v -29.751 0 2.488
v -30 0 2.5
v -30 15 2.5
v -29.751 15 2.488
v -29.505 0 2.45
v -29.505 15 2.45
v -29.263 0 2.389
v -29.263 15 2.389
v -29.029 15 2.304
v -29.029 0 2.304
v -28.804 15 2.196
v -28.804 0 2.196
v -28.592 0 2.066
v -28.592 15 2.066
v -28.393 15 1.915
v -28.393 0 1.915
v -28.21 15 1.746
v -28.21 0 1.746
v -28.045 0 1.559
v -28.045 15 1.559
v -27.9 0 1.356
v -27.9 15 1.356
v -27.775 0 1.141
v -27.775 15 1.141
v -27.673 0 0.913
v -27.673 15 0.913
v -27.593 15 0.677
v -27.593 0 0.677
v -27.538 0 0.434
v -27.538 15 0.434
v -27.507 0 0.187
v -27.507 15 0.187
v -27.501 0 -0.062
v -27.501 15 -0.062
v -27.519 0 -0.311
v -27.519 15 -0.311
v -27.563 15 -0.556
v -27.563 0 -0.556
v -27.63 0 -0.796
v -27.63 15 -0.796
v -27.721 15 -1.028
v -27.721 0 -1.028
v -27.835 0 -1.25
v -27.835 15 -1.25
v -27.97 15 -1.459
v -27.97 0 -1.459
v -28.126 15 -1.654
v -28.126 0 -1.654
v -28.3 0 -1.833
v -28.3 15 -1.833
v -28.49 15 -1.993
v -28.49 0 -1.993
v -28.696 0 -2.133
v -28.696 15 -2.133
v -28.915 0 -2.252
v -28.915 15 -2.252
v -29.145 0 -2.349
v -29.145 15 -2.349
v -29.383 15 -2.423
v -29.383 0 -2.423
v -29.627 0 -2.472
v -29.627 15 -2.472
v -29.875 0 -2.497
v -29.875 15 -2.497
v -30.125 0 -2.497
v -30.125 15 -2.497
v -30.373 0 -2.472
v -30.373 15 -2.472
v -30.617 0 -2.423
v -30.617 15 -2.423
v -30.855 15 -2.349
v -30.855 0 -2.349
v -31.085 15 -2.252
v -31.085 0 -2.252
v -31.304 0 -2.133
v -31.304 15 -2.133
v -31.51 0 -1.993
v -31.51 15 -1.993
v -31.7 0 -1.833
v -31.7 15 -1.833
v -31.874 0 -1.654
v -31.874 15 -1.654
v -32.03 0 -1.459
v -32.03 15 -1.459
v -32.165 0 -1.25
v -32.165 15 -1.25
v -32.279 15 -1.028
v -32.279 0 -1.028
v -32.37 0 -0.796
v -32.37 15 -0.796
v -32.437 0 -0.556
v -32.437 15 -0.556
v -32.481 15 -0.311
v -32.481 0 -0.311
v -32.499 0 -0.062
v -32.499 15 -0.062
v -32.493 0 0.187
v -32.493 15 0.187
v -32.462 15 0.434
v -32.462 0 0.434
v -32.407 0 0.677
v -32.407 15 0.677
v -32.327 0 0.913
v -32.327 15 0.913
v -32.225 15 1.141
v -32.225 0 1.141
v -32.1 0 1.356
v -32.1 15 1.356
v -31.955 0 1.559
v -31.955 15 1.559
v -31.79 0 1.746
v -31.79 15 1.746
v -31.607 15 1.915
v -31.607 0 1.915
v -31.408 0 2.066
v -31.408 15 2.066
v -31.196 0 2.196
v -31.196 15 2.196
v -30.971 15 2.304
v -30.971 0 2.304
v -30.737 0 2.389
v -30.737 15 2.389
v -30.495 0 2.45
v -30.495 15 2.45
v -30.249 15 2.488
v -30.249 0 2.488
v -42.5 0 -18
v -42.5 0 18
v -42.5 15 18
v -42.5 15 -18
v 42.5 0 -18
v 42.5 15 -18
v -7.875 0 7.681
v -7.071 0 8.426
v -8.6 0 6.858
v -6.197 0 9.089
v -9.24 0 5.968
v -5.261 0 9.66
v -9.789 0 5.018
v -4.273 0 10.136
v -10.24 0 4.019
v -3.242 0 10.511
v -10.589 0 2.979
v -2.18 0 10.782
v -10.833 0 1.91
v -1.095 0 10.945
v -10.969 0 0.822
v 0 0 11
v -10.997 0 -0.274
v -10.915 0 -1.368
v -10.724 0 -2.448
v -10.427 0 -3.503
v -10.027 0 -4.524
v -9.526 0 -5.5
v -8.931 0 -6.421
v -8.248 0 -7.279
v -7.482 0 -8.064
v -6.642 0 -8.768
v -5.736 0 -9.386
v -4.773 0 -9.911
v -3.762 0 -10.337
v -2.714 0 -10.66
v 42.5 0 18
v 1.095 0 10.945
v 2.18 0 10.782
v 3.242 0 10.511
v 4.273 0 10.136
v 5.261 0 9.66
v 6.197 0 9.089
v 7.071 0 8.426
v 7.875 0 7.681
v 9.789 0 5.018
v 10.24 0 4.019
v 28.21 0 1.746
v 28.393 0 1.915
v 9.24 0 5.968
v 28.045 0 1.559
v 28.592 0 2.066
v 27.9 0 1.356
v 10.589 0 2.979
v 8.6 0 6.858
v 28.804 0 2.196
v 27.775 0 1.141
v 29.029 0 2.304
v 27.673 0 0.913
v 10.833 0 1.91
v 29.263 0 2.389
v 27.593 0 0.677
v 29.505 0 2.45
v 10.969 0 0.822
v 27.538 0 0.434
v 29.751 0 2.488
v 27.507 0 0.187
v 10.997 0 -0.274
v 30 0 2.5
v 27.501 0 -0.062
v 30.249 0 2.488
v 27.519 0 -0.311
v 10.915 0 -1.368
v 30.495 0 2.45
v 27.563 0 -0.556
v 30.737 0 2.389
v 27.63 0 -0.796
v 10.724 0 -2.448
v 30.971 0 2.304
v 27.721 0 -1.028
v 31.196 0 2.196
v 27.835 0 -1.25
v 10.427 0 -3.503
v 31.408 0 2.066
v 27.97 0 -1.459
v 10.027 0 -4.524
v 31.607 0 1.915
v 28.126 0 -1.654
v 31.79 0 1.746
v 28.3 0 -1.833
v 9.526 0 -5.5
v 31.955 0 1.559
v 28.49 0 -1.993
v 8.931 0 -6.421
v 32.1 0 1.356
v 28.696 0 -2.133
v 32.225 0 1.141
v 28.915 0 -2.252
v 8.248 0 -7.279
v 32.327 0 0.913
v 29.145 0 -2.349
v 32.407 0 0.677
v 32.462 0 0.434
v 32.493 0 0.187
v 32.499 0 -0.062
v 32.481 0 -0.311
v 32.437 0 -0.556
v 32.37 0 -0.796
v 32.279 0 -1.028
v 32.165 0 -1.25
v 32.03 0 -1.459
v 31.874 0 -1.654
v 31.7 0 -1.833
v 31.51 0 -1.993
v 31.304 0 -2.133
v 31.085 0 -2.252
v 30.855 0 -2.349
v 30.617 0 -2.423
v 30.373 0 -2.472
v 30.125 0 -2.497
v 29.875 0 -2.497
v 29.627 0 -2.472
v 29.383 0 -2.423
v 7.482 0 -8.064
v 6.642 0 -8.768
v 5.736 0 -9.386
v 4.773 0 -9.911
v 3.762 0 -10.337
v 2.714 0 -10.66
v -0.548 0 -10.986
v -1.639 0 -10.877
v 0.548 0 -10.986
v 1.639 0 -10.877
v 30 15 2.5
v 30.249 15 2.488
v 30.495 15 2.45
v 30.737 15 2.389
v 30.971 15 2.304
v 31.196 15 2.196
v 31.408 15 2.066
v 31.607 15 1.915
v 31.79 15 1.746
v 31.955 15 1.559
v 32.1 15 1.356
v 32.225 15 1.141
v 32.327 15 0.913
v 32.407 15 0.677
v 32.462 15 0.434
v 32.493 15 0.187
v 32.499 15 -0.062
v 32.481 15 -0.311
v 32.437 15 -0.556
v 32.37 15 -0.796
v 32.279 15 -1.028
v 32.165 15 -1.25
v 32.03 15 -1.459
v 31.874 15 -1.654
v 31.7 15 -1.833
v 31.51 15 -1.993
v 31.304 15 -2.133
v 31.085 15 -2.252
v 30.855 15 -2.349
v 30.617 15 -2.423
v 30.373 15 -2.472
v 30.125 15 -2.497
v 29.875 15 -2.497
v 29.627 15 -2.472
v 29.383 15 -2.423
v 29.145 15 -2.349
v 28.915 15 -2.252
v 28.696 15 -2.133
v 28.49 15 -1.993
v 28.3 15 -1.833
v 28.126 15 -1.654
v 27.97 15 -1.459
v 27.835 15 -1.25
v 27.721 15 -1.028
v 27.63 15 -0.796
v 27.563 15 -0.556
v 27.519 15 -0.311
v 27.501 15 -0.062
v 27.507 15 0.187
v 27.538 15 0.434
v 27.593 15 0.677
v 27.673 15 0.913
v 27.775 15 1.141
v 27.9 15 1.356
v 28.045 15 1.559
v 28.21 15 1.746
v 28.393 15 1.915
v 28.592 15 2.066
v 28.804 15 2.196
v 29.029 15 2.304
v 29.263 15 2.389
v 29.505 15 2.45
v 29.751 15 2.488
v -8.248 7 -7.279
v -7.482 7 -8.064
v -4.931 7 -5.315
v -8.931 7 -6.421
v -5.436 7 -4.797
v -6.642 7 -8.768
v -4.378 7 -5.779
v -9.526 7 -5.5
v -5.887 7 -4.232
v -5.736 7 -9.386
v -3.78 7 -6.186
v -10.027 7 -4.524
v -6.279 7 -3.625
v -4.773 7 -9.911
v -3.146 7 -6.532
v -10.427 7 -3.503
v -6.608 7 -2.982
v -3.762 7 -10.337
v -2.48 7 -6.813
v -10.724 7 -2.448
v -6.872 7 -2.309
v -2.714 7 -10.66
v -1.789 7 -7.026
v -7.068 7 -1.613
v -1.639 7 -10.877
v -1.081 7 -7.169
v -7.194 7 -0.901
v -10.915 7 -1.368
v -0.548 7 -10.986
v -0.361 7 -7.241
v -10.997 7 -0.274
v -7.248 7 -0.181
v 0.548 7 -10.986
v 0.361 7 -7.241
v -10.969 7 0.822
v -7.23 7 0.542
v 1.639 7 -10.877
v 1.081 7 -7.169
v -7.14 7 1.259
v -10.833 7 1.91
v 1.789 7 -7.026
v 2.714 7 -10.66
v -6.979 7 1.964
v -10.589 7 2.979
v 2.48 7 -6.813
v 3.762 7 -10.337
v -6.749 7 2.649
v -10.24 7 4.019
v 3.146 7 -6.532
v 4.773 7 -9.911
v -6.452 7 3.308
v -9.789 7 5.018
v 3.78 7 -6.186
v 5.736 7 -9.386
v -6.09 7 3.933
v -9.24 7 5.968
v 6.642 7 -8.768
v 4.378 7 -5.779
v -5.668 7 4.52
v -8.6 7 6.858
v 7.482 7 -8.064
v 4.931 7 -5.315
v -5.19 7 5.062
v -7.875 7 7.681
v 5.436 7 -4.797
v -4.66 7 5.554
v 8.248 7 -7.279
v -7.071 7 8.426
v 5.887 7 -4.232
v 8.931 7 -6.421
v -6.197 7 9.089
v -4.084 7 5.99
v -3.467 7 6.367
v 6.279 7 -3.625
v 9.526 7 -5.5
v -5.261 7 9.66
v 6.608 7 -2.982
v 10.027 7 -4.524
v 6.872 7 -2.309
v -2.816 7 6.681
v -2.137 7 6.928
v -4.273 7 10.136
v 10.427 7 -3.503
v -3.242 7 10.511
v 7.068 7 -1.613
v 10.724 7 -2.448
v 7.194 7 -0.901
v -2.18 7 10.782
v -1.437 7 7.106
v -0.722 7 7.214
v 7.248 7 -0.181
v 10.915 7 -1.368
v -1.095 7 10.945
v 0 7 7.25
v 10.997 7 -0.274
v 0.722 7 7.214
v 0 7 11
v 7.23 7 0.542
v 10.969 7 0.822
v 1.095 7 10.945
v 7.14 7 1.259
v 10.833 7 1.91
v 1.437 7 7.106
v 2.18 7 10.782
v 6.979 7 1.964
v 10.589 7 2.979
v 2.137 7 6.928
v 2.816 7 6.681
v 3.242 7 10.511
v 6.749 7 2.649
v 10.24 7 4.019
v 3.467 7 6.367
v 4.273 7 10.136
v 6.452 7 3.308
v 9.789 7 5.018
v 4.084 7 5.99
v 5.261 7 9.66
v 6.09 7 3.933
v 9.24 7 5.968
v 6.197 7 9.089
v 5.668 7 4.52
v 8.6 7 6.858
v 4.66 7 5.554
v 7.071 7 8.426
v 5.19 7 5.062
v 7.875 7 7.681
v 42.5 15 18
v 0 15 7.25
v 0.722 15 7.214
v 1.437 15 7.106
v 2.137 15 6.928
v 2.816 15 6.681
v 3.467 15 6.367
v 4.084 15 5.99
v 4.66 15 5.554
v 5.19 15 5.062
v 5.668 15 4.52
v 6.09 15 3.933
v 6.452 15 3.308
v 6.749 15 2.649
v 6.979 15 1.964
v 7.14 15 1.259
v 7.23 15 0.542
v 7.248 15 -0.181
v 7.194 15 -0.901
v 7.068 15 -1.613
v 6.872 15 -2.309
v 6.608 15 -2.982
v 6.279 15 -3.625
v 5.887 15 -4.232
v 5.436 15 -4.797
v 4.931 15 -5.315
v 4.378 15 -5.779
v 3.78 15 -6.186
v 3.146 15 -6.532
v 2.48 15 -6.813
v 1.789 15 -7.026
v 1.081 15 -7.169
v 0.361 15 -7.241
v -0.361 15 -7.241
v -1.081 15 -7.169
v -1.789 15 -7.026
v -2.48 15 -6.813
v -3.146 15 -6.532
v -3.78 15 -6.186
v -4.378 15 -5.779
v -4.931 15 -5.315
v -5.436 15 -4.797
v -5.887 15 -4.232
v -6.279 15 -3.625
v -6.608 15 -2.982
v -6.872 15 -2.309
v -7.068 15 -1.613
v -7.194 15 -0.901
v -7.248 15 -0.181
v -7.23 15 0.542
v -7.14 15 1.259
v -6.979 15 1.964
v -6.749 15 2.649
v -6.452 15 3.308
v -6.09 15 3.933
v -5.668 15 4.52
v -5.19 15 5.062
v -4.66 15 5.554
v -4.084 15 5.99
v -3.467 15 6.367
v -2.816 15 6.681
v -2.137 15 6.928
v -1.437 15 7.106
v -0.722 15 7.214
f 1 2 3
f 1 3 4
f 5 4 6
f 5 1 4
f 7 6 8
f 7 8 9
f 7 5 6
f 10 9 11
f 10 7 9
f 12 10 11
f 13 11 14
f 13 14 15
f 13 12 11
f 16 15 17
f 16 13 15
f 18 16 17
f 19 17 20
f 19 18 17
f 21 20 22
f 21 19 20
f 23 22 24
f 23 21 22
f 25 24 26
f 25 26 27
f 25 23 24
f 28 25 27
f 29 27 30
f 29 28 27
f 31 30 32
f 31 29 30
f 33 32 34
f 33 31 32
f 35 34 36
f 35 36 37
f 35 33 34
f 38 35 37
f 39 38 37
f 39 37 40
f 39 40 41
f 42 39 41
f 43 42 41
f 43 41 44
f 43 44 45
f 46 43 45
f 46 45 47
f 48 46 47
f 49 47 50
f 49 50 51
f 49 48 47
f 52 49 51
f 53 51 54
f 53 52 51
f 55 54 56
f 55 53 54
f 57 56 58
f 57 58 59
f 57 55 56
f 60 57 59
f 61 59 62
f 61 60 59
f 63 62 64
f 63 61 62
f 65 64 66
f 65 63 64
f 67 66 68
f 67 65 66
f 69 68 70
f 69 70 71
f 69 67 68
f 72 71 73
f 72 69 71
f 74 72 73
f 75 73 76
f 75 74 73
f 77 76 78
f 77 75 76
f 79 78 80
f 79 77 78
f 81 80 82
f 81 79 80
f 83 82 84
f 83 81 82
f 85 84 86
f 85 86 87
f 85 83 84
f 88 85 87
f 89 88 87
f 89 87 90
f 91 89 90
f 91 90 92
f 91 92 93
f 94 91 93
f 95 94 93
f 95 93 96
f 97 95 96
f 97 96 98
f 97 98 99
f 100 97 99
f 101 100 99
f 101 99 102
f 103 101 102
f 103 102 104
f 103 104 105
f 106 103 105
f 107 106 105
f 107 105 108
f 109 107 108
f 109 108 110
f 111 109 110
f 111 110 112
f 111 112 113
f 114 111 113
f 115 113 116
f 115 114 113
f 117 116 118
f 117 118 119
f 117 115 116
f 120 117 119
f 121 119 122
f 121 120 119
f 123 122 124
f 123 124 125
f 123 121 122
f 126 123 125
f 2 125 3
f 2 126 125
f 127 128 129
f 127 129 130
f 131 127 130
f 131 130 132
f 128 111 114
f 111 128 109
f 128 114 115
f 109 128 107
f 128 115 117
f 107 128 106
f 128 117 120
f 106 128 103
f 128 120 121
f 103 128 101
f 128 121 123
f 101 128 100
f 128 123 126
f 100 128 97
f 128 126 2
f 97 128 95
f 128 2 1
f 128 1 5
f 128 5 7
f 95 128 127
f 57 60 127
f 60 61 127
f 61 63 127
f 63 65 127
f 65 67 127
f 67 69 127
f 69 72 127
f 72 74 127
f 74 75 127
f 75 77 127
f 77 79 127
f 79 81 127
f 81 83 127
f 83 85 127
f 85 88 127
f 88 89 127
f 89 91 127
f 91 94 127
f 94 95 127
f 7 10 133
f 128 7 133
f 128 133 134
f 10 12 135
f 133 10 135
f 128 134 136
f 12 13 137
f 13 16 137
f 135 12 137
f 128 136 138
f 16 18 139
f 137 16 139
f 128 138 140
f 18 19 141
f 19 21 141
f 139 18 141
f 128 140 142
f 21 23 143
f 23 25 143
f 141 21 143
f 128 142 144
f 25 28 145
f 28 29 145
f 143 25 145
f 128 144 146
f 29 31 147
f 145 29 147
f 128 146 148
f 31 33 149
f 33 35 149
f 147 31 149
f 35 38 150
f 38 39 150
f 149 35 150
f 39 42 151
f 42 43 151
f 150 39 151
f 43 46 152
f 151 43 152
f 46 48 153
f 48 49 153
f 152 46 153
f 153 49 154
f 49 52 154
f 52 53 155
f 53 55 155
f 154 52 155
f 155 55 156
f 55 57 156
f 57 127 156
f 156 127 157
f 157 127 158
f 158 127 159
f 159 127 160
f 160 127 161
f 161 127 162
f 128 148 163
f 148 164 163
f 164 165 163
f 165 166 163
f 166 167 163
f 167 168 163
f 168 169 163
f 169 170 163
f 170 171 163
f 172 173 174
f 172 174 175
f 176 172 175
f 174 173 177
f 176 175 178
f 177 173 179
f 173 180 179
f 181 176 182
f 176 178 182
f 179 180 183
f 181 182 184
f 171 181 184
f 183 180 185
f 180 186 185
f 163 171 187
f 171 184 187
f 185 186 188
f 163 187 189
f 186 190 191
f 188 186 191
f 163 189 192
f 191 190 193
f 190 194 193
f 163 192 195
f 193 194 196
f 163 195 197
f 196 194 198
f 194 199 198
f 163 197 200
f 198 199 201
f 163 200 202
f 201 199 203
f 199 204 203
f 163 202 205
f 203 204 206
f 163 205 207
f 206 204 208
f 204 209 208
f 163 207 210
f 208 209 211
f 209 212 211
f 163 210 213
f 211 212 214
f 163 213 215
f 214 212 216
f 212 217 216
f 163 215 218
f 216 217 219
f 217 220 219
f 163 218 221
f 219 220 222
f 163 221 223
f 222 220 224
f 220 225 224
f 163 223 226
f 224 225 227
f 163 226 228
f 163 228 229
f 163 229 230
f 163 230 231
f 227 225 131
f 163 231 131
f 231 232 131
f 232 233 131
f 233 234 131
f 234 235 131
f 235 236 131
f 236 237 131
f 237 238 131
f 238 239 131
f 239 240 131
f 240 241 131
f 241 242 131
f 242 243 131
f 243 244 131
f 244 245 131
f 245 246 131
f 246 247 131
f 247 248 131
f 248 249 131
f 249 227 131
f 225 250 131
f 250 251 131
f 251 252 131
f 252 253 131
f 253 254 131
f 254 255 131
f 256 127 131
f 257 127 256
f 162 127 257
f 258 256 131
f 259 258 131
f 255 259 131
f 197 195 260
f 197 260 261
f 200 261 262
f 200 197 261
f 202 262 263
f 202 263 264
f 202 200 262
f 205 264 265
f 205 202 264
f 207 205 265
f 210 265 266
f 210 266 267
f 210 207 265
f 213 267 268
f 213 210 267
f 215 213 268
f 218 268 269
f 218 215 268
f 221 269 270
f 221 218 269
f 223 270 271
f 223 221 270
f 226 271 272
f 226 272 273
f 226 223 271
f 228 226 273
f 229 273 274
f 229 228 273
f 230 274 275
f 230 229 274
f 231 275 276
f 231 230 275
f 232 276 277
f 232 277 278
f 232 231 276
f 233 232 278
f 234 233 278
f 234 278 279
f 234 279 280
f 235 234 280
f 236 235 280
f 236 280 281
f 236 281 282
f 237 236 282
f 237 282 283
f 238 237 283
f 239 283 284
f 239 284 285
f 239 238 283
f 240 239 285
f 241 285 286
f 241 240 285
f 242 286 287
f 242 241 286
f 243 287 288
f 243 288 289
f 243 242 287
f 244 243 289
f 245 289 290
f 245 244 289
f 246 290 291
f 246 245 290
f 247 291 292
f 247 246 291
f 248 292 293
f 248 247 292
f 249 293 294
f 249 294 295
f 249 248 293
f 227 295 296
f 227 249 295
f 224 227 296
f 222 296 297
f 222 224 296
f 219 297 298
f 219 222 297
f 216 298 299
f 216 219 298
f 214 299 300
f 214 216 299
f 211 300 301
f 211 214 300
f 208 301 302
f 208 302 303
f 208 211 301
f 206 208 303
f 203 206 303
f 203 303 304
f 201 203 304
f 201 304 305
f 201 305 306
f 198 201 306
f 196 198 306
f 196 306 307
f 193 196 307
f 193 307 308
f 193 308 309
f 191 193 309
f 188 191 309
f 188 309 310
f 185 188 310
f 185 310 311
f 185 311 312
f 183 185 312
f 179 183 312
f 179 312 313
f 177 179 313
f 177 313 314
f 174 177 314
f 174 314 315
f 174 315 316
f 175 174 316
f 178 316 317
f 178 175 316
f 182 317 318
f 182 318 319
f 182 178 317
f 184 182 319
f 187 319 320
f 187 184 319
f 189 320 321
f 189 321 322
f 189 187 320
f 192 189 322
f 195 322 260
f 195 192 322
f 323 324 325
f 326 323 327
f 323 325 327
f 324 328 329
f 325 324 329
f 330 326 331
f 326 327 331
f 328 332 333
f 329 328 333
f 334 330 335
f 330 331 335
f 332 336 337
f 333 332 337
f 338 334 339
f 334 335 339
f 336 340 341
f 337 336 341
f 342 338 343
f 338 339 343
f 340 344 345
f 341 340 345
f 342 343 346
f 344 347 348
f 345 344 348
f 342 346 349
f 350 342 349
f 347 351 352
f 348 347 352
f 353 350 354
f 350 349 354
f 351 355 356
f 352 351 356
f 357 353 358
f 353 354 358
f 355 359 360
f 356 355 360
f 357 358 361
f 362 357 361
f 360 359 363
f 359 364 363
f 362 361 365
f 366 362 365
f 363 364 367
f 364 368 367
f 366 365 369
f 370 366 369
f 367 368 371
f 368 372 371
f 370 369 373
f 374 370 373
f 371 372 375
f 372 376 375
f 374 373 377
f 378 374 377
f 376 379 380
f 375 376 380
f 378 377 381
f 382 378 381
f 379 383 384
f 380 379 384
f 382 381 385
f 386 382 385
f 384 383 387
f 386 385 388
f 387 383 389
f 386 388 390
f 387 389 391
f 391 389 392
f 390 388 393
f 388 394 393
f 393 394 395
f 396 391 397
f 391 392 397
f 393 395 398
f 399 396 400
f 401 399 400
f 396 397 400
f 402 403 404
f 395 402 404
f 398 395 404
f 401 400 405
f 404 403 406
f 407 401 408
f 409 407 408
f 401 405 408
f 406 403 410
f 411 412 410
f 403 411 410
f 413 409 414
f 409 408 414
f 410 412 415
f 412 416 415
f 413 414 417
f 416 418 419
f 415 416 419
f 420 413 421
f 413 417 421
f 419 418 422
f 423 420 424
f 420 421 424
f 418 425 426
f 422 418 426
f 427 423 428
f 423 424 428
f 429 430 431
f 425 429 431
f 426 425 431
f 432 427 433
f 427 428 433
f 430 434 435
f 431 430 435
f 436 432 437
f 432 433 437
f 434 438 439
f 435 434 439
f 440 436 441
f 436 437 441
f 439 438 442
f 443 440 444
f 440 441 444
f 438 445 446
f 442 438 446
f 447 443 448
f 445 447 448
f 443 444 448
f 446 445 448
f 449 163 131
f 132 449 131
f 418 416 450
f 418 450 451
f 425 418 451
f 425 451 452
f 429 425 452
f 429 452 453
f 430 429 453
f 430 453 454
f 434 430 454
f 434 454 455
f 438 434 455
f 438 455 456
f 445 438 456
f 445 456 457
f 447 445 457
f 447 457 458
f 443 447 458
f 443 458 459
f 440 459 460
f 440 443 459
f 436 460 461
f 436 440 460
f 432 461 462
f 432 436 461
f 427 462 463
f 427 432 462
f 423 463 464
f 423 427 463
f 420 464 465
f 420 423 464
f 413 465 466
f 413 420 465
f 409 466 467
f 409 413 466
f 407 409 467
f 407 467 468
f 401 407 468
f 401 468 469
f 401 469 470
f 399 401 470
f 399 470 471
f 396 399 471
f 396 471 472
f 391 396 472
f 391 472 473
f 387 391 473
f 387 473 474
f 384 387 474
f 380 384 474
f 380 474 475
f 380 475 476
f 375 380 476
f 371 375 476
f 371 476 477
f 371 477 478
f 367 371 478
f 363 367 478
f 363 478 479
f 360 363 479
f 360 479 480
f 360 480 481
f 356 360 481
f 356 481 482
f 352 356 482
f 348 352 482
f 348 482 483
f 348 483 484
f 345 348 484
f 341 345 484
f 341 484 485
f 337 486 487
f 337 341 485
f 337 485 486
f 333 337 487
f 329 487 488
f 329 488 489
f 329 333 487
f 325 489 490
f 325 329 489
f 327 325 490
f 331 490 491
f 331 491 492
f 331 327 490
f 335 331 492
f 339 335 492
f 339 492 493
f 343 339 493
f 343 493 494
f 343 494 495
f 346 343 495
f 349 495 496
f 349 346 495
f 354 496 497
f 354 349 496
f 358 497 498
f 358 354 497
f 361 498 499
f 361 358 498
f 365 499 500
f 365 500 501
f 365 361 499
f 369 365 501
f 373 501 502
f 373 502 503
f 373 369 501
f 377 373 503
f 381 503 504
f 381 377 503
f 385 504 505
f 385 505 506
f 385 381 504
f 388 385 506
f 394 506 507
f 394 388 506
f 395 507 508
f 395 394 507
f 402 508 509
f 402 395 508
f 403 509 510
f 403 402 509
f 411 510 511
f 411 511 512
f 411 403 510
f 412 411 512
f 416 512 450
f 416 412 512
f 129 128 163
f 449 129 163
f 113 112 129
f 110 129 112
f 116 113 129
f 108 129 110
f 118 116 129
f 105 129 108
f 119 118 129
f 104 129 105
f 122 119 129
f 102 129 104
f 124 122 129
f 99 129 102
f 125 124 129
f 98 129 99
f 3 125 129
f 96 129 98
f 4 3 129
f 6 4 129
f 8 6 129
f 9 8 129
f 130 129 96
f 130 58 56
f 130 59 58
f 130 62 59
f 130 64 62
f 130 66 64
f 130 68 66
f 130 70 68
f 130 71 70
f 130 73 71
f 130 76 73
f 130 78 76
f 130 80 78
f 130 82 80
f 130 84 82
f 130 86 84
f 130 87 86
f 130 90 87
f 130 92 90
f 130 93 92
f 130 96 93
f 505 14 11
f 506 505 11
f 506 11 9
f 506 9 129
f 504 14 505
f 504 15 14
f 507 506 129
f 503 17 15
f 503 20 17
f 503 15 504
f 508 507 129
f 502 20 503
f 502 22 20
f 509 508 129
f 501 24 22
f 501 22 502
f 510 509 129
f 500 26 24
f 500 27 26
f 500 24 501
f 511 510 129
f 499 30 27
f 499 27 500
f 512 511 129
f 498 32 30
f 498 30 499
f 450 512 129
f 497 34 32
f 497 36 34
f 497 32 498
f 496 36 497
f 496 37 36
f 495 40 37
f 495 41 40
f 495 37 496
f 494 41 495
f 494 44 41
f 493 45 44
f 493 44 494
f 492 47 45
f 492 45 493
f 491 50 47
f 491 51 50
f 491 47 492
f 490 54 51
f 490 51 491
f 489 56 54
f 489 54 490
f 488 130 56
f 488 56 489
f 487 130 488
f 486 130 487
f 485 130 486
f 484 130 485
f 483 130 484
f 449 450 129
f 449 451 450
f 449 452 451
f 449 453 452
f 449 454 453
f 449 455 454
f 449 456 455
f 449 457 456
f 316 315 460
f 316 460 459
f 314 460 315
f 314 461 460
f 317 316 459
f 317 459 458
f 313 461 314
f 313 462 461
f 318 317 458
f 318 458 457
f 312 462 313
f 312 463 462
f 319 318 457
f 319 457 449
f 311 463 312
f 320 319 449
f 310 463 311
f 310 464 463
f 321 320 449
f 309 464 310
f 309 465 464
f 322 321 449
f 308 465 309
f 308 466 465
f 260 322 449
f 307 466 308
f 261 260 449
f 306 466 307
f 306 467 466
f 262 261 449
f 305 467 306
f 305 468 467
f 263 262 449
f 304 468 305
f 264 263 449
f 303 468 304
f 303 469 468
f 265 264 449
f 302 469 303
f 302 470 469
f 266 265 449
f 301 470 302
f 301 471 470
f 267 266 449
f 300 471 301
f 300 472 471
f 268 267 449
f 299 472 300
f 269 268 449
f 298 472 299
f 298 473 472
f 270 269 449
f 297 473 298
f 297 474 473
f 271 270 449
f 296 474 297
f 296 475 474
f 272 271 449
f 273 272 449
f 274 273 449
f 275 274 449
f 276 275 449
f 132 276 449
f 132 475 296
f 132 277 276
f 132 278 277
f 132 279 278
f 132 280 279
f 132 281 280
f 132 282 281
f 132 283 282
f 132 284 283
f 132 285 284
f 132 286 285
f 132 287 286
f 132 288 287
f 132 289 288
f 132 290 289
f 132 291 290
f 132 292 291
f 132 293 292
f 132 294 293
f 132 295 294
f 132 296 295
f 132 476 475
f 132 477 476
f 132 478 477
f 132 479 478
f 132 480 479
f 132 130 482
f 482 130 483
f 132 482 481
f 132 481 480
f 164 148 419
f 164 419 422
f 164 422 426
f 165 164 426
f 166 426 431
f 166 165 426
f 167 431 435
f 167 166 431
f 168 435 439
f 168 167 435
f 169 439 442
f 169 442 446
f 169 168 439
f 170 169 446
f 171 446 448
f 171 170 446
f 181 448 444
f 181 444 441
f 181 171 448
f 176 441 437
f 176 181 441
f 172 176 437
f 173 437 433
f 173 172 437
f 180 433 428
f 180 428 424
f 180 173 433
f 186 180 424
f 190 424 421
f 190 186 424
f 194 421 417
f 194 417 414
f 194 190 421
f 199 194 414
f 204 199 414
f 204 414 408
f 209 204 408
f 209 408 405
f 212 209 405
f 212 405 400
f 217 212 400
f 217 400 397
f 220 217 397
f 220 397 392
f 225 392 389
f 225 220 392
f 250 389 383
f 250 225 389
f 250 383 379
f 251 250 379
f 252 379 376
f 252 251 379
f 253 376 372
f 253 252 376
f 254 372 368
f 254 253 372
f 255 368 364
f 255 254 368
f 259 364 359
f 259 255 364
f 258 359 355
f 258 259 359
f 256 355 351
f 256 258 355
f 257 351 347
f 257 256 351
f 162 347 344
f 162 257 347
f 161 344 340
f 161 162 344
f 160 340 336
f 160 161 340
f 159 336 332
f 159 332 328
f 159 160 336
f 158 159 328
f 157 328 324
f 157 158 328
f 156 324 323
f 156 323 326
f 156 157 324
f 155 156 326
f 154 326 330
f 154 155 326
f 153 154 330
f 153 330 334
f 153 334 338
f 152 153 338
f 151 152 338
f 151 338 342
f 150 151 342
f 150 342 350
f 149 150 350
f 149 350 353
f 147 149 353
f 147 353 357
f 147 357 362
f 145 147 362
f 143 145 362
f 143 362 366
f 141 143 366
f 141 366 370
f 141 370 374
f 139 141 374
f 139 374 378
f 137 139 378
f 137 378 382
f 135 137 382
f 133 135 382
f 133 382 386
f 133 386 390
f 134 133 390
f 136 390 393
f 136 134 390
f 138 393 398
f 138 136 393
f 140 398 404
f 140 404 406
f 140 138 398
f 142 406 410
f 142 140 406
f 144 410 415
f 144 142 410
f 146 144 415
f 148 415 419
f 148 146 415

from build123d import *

# Parameters (mm, degrees)
SKETCH1_W           = 85
SKETCH1_H           = 36
SKETCH1_R           = 7.25
SKETCH1_R_2         = 2.5
BOSS_EXTRUDE1_DEPTH = 15
SKETCH2_R           = 11
CUT_EXTRUDE1_DEPTH  = 7


with BuildPart() as part:
    # Sketch1 → Boss-Extrude1 (new body)
    with BuildSketch(Plane(origin=(0, 0, 0), x_dir=(1, 0, 0), z_dir=(0, 1, 0))):
        Rectangle(SKETCH1_W, SKETCH1_H)
        with Locations(Location((0, 0, 0), (0, 0, 270))):
            Circle(SKETCH1_R, mode=Mode.SUBTRACT)
        with Locations(Location((-30, 0, 0), (0, 0, 270))):
            Circle(SKETCH1_R_2, mode=Mode.SUBTRACT)
        with Locations(Location((30, 0, 0), (0, 0, 270))):
            Circle(SKETCH1_R_2, mode=Mode.SUBTRACT)
    extrude(amount=BOSS_EXTRUDE1_DEPTH)

    # Sketch2 → Cut-Extrude1 (cut)
    with BuildSketch(Plane(origin=(0, 0, 0), x_dir=(1, 0, 0), z_dir=(0, 1, 0))):
        with Locations(Location((0, 0, 0), (0, 0, 270))):
            Circle(SKETCH2_R)
    extrude(amount=CUT_EXTRUDE1_DEPTH, mode=Mode.SUBTRACT)


solid = part.part
